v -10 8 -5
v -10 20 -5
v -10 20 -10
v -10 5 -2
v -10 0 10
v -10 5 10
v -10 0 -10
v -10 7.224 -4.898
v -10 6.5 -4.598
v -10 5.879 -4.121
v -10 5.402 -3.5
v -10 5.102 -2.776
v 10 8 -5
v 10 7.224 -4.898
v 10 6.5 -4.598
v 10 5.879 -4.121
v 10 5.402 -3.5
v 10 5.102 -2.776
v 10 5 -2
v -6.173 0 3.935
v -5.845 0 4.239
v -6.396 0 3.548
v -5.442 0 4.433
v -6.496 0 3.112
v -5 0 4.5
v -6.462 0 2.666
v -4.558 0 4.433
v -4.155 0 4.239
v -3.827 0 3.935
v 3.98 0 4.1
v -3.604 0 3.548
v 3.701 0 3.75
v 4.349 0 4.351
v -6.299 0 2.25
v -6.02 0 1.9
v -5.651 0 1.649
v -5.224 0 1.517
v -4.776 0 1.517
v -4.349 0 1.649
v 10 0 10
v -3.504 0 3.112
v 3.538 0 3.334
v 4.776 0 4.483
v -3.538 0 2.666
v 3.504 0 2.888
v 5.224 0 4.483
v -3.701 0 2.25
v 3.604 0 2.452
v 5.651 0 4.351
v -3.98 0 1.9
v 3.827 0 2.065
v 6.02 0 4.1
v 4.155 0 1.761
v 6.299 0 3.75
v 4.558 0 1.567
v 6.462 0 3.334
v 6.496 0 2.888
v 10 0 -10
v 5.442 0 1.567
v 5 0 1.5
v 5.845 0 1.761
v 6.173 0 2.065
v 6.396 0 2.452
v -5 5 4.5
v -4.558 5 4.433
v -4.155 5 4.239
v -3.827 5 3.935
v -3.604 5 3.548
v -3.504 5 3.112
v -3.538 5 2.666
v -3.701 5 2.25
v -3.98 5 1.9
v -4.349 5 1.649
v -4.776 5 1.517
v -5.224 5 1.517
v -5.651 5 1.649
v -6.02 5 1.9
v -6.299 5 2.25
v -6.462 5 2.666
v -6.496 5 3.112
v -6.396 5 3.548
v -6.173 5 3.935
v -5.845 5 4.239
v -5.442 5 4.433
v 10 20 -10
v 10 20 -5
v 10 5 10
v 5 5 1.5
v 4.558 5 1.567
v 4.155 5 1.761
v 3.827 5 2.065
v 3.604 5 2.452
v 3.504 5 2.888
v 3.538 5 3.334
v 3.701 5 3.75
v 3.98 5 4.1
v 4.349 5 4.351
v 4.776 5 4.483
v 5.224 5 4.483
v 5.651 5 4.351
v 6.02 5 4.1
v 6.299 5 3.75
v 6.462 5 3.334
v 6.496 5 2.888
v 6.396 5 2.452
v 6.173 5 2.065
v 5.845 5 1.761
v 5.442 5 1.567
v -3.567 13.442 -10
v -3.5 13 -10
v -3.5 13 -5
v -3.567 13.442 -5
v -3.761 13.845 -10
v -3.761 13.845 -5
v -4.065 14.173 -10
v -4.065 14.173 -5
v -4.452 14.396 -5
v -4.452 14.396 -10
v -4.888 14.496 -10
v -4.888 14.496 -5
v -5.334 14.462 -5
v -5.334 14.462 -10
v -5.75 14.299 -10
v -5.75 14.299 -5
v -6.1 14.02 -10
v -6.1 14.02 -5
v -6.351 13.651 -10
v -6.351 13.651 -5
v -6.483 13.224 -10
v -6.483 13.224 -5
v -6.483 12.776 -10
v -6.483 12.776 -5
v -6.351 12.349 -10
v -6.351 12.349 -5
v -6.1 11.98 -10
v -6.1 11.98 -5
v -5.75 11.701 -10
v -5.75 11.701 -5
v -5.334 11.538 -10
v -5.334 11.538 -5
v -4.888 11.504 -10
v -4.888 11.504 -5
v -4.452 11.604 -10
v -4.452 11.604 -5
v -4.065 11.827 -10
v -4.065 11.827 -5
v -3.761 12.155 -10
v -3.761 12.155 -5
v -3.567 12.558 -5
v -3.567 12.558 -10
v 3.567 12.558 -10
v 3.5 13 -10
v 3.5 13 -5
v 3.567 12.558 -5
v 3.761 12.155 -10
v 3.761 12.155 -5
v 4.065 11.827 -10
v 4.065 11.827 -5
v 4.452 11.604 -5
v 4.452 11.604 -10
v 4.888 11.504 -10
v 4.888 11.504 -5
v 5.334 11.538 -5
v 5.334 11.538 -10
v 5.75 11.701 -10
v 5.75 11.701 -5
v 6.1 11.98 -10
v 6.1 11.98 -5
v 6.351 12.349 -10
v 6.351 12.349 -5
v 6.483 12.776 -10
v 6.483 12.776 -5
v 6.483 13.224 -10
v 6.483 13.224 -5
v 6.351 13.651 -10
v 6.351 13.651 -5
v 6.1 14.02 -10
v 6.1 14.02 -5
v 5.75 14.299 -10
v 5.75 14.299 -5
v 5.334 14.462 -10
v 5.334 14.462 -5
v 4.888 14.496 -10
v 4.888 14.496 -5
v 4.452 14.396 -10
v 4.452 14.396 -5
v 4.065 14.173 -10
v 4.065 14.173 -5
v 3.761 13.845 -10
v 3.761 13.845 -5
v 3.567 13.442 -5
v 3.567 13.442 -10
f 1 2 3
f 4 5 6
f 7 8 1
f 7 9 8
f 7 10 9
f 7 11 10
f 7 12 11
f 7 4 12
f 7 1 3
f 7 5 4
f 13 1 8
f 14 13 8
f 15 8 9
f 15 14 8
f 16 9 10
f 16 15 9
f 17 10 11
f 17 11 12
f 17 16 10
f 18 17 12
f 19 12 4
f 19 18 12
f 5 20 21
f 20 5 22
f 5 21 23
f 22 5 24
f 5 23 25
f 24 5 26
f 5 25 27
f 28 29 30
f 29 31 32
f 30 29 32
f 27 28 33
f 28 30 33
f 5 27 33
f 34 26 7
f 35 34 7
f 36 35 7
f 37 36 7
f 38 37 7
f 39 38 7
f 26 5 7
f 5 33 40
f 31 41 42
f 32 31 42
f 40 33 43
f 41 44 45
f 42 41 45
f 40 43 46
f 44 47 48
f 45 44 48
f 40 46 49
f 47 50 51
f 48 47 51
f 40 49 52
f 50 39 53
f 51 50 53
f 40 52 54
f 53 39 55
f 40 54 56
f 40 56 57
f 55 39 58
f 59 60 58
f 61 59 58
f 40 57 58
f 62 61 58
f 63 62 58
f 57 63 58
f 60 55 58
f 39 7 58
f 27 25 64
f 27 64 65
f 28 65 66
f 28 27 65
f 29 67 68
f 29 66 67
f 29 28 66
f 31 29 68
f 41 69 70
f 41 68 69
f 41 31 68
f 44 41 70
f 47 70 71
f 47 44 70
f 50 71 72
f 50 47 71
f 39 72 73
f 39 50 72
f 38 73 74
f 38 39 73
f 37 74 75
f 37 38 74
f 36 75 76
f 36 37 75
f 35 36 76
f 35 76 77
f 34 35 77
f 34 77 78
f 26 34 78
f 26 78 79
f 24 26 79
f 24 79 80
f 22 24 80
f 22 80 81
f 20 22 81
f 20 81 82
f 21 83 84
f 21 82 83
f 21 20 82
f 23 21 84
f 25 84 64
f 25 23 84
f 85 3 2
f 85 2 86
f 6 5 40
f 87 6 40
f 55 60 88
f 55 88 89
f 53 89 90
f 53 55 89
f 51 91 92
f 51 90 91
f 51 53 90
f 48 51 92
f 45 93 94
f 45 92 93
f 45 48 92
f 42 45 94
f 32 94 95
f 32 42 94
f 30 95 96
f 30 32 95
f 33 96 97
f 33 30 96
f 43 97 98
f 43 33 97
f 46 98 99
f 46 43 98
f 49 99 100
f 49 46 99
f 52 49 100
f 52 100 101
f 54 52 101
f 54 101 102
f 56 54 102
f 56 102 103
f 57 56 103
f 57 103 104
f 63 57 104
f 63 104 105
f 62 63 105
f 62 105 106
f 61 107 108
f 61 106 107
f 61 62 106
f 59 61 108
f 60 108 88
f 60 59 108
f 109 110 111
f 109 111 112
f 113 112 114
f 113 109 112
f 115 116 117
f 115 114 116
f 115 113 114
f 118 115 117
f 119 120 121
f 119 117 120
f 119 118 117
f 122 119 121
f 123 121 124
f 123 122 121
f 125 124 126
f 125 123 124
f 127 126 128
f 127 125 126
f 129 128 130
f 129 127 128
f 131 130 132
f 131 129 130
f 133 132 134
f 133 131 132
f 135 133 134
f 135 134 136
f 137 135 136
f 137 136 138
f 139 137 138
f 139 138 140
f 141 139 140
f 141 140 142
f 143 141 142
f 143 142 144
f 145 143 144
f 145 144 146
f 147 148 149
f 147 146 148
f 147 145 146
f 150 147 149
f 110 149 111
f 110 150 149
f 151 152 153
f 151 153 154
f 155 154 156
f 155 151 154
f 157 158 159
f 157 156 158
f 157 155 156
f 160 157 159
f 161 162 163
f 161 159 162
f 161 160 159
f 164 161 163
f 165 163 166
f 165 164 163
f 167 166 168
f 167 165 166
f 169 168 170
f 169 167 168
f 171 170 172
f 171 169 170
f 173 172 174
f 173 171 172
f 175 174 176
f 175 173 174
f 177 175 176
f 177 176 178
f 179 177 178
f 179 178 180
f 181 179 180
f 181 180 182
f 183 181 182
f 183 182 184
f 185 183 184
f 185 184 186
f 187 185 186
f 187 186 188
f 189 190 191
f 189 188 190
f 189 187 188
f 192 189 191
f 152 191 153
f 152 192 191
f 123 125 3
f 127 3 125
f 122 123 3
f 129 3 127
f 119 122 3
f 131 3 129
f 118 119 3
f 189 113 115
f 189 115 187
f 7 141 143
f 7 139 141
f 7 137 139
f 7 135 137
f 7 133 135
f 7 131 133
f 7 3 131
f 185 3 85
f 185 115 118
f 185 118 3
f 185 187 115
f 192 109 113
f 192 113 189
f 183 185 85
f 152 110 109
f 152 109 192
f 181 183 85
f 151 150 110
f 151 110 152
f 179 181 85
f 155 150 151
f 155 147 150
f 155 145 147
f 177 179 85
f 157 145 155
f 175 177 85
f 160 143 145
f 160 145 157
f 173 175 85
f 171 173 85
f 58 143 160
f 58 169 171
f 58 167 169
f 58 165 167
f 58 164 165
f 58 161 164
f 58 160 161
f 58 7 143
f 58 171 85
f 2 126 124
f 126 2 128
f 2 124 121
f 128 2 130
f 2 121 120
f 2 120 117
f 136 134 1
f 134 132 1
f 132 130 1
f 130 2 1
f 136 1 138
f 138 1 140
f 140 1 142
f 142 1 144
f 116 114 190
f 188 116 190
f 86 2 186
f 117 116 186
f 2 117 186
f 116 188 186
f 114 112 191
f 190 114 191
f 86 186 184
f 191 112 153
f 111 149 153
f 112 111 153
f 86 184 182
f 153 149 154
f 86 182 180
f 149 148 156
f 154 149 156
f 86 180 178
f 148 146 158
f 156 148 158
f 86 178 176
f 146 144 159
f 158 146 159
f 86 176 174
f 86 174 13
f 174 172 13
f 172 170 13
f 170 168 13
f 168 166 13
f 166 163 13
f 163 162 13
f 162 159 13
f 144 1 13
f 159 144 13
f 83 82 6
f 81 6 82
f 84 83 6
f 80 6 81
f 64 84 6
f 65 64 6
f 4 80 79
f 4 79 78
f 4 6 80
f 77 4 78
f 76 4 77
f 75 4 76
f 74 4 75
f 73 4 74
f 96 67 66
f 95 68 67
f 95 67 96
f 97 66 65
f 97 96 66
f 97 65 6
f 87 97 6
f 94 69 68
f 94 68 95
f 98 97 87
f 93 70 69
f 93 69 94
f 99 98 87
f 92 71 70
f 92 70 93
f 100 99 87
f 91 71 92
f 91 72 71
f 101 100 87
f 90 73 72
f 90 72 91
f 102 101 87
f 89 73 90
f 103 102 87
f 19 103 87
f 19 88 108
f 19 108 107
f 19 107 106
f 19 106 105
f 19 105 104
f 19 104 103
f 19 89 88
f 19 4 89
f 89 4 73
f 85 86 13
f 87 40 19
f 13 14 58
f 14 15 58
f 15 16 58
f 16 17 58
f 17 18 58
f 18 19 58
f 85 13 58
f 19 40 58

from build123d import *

# Parameters (mm, degrees)
SKETCH1_W               = 20
SKETCH1_H               = 20
BOSS_EXTRUDE1_DEPTH     = 5
SKETCH2_W               = 20
SKETCH2_H               = 5
BOSS_EXTRUDE2_DEPTH     = 15
CUT_EXTRUDE1_DEPTH      = 21.615528128
CUT_EXTRUDE1_DEPTH_BACK = 21.615528128
SKETCH3_R               = 1.5
CUT_EXTRUDE2_DEPTH      = 27.925824036
CUT_EXTRUDE2_DEPTH_BACK = 27.925824036
SKETCH4_R               = 1.5
FILLET1_R               = 3


with BuildPart() as part:
    # Sketch1 → Boss-Extrude1 (new body)
    with BuildSketch(Plane(origin=(0, 0, 0), x_dir=(1, 0, 0), z_dir=(0, 1, 0))):
        Rectangle(SKETCH1_W, SKETCH1_H)
    extrude(amount=BOSS_EXTRUDE1_DEPTH)

    # Sketch2 → Boss-Extrude2 (add)
    with BuildSketch(Plane(origin=(0, 5, 0), x_dir=(1, 0, 0), z_dir=(0, 1, 0))):
        with Locations((0, 7.5)):
            Rectangle(SKETCH2_W, SKETCH2_H)
    extrude(amount=BOSS_EXTRUDE2_DEPTH)

    # Sketch3 → Cut-Extrude1 (cut, two sides: drawn at the far end of the back side and taken through both)
    with BuildSketch(Plane(origin=(0, 5, 0), x_dir=(1, 0, 0), z_dir=(0, 1, 0)).offset(-CUT_EXTRUDE1_DEPTH_BACK)):
        with Locations(Location((-5, -3, 0), (0, 0, 270))):
            Circle(SKETCH3_R)
        with Locations(Location((5, -3, 0), (0, 0, 90))):
            Circle(SKETCH3_R)
    extrude(amount=CUT_EXTRUDE1_DEPTH + CUT_EXTRUDE1_DEPTH_BACK, mode=Mode.SUBTRACT)

    # Sketch4 → Cut-Extrude2 (cut, two sides: drawn at the far end of the back side and taken through both)
    with BuildSketch(Plane.XY.offset(-5).offset(-CUT_EXTRUDE2_DEPTH_BACK)):
        with Locations((-5, 13)):
            Circle(SKETCH4_R)
        with Locations(Location((5, 13, 0), (0, 0, 180))):
            Circle(SKETCH4_R)
    extrude(amount=CUT_EXTRUDE2_DEPTH + CUT_EXTRUDE2_DEPTH_BACK, mode=Mode.SUBTRACT)

    # Fillet1
    fillet1_edges = [part.edges().sort_by_distance(p)[0] for p in [
        (0, 5, -5),
    ]]
    fillet(fillet1_edges, radius=FILLET1_R)


solid = part.part
